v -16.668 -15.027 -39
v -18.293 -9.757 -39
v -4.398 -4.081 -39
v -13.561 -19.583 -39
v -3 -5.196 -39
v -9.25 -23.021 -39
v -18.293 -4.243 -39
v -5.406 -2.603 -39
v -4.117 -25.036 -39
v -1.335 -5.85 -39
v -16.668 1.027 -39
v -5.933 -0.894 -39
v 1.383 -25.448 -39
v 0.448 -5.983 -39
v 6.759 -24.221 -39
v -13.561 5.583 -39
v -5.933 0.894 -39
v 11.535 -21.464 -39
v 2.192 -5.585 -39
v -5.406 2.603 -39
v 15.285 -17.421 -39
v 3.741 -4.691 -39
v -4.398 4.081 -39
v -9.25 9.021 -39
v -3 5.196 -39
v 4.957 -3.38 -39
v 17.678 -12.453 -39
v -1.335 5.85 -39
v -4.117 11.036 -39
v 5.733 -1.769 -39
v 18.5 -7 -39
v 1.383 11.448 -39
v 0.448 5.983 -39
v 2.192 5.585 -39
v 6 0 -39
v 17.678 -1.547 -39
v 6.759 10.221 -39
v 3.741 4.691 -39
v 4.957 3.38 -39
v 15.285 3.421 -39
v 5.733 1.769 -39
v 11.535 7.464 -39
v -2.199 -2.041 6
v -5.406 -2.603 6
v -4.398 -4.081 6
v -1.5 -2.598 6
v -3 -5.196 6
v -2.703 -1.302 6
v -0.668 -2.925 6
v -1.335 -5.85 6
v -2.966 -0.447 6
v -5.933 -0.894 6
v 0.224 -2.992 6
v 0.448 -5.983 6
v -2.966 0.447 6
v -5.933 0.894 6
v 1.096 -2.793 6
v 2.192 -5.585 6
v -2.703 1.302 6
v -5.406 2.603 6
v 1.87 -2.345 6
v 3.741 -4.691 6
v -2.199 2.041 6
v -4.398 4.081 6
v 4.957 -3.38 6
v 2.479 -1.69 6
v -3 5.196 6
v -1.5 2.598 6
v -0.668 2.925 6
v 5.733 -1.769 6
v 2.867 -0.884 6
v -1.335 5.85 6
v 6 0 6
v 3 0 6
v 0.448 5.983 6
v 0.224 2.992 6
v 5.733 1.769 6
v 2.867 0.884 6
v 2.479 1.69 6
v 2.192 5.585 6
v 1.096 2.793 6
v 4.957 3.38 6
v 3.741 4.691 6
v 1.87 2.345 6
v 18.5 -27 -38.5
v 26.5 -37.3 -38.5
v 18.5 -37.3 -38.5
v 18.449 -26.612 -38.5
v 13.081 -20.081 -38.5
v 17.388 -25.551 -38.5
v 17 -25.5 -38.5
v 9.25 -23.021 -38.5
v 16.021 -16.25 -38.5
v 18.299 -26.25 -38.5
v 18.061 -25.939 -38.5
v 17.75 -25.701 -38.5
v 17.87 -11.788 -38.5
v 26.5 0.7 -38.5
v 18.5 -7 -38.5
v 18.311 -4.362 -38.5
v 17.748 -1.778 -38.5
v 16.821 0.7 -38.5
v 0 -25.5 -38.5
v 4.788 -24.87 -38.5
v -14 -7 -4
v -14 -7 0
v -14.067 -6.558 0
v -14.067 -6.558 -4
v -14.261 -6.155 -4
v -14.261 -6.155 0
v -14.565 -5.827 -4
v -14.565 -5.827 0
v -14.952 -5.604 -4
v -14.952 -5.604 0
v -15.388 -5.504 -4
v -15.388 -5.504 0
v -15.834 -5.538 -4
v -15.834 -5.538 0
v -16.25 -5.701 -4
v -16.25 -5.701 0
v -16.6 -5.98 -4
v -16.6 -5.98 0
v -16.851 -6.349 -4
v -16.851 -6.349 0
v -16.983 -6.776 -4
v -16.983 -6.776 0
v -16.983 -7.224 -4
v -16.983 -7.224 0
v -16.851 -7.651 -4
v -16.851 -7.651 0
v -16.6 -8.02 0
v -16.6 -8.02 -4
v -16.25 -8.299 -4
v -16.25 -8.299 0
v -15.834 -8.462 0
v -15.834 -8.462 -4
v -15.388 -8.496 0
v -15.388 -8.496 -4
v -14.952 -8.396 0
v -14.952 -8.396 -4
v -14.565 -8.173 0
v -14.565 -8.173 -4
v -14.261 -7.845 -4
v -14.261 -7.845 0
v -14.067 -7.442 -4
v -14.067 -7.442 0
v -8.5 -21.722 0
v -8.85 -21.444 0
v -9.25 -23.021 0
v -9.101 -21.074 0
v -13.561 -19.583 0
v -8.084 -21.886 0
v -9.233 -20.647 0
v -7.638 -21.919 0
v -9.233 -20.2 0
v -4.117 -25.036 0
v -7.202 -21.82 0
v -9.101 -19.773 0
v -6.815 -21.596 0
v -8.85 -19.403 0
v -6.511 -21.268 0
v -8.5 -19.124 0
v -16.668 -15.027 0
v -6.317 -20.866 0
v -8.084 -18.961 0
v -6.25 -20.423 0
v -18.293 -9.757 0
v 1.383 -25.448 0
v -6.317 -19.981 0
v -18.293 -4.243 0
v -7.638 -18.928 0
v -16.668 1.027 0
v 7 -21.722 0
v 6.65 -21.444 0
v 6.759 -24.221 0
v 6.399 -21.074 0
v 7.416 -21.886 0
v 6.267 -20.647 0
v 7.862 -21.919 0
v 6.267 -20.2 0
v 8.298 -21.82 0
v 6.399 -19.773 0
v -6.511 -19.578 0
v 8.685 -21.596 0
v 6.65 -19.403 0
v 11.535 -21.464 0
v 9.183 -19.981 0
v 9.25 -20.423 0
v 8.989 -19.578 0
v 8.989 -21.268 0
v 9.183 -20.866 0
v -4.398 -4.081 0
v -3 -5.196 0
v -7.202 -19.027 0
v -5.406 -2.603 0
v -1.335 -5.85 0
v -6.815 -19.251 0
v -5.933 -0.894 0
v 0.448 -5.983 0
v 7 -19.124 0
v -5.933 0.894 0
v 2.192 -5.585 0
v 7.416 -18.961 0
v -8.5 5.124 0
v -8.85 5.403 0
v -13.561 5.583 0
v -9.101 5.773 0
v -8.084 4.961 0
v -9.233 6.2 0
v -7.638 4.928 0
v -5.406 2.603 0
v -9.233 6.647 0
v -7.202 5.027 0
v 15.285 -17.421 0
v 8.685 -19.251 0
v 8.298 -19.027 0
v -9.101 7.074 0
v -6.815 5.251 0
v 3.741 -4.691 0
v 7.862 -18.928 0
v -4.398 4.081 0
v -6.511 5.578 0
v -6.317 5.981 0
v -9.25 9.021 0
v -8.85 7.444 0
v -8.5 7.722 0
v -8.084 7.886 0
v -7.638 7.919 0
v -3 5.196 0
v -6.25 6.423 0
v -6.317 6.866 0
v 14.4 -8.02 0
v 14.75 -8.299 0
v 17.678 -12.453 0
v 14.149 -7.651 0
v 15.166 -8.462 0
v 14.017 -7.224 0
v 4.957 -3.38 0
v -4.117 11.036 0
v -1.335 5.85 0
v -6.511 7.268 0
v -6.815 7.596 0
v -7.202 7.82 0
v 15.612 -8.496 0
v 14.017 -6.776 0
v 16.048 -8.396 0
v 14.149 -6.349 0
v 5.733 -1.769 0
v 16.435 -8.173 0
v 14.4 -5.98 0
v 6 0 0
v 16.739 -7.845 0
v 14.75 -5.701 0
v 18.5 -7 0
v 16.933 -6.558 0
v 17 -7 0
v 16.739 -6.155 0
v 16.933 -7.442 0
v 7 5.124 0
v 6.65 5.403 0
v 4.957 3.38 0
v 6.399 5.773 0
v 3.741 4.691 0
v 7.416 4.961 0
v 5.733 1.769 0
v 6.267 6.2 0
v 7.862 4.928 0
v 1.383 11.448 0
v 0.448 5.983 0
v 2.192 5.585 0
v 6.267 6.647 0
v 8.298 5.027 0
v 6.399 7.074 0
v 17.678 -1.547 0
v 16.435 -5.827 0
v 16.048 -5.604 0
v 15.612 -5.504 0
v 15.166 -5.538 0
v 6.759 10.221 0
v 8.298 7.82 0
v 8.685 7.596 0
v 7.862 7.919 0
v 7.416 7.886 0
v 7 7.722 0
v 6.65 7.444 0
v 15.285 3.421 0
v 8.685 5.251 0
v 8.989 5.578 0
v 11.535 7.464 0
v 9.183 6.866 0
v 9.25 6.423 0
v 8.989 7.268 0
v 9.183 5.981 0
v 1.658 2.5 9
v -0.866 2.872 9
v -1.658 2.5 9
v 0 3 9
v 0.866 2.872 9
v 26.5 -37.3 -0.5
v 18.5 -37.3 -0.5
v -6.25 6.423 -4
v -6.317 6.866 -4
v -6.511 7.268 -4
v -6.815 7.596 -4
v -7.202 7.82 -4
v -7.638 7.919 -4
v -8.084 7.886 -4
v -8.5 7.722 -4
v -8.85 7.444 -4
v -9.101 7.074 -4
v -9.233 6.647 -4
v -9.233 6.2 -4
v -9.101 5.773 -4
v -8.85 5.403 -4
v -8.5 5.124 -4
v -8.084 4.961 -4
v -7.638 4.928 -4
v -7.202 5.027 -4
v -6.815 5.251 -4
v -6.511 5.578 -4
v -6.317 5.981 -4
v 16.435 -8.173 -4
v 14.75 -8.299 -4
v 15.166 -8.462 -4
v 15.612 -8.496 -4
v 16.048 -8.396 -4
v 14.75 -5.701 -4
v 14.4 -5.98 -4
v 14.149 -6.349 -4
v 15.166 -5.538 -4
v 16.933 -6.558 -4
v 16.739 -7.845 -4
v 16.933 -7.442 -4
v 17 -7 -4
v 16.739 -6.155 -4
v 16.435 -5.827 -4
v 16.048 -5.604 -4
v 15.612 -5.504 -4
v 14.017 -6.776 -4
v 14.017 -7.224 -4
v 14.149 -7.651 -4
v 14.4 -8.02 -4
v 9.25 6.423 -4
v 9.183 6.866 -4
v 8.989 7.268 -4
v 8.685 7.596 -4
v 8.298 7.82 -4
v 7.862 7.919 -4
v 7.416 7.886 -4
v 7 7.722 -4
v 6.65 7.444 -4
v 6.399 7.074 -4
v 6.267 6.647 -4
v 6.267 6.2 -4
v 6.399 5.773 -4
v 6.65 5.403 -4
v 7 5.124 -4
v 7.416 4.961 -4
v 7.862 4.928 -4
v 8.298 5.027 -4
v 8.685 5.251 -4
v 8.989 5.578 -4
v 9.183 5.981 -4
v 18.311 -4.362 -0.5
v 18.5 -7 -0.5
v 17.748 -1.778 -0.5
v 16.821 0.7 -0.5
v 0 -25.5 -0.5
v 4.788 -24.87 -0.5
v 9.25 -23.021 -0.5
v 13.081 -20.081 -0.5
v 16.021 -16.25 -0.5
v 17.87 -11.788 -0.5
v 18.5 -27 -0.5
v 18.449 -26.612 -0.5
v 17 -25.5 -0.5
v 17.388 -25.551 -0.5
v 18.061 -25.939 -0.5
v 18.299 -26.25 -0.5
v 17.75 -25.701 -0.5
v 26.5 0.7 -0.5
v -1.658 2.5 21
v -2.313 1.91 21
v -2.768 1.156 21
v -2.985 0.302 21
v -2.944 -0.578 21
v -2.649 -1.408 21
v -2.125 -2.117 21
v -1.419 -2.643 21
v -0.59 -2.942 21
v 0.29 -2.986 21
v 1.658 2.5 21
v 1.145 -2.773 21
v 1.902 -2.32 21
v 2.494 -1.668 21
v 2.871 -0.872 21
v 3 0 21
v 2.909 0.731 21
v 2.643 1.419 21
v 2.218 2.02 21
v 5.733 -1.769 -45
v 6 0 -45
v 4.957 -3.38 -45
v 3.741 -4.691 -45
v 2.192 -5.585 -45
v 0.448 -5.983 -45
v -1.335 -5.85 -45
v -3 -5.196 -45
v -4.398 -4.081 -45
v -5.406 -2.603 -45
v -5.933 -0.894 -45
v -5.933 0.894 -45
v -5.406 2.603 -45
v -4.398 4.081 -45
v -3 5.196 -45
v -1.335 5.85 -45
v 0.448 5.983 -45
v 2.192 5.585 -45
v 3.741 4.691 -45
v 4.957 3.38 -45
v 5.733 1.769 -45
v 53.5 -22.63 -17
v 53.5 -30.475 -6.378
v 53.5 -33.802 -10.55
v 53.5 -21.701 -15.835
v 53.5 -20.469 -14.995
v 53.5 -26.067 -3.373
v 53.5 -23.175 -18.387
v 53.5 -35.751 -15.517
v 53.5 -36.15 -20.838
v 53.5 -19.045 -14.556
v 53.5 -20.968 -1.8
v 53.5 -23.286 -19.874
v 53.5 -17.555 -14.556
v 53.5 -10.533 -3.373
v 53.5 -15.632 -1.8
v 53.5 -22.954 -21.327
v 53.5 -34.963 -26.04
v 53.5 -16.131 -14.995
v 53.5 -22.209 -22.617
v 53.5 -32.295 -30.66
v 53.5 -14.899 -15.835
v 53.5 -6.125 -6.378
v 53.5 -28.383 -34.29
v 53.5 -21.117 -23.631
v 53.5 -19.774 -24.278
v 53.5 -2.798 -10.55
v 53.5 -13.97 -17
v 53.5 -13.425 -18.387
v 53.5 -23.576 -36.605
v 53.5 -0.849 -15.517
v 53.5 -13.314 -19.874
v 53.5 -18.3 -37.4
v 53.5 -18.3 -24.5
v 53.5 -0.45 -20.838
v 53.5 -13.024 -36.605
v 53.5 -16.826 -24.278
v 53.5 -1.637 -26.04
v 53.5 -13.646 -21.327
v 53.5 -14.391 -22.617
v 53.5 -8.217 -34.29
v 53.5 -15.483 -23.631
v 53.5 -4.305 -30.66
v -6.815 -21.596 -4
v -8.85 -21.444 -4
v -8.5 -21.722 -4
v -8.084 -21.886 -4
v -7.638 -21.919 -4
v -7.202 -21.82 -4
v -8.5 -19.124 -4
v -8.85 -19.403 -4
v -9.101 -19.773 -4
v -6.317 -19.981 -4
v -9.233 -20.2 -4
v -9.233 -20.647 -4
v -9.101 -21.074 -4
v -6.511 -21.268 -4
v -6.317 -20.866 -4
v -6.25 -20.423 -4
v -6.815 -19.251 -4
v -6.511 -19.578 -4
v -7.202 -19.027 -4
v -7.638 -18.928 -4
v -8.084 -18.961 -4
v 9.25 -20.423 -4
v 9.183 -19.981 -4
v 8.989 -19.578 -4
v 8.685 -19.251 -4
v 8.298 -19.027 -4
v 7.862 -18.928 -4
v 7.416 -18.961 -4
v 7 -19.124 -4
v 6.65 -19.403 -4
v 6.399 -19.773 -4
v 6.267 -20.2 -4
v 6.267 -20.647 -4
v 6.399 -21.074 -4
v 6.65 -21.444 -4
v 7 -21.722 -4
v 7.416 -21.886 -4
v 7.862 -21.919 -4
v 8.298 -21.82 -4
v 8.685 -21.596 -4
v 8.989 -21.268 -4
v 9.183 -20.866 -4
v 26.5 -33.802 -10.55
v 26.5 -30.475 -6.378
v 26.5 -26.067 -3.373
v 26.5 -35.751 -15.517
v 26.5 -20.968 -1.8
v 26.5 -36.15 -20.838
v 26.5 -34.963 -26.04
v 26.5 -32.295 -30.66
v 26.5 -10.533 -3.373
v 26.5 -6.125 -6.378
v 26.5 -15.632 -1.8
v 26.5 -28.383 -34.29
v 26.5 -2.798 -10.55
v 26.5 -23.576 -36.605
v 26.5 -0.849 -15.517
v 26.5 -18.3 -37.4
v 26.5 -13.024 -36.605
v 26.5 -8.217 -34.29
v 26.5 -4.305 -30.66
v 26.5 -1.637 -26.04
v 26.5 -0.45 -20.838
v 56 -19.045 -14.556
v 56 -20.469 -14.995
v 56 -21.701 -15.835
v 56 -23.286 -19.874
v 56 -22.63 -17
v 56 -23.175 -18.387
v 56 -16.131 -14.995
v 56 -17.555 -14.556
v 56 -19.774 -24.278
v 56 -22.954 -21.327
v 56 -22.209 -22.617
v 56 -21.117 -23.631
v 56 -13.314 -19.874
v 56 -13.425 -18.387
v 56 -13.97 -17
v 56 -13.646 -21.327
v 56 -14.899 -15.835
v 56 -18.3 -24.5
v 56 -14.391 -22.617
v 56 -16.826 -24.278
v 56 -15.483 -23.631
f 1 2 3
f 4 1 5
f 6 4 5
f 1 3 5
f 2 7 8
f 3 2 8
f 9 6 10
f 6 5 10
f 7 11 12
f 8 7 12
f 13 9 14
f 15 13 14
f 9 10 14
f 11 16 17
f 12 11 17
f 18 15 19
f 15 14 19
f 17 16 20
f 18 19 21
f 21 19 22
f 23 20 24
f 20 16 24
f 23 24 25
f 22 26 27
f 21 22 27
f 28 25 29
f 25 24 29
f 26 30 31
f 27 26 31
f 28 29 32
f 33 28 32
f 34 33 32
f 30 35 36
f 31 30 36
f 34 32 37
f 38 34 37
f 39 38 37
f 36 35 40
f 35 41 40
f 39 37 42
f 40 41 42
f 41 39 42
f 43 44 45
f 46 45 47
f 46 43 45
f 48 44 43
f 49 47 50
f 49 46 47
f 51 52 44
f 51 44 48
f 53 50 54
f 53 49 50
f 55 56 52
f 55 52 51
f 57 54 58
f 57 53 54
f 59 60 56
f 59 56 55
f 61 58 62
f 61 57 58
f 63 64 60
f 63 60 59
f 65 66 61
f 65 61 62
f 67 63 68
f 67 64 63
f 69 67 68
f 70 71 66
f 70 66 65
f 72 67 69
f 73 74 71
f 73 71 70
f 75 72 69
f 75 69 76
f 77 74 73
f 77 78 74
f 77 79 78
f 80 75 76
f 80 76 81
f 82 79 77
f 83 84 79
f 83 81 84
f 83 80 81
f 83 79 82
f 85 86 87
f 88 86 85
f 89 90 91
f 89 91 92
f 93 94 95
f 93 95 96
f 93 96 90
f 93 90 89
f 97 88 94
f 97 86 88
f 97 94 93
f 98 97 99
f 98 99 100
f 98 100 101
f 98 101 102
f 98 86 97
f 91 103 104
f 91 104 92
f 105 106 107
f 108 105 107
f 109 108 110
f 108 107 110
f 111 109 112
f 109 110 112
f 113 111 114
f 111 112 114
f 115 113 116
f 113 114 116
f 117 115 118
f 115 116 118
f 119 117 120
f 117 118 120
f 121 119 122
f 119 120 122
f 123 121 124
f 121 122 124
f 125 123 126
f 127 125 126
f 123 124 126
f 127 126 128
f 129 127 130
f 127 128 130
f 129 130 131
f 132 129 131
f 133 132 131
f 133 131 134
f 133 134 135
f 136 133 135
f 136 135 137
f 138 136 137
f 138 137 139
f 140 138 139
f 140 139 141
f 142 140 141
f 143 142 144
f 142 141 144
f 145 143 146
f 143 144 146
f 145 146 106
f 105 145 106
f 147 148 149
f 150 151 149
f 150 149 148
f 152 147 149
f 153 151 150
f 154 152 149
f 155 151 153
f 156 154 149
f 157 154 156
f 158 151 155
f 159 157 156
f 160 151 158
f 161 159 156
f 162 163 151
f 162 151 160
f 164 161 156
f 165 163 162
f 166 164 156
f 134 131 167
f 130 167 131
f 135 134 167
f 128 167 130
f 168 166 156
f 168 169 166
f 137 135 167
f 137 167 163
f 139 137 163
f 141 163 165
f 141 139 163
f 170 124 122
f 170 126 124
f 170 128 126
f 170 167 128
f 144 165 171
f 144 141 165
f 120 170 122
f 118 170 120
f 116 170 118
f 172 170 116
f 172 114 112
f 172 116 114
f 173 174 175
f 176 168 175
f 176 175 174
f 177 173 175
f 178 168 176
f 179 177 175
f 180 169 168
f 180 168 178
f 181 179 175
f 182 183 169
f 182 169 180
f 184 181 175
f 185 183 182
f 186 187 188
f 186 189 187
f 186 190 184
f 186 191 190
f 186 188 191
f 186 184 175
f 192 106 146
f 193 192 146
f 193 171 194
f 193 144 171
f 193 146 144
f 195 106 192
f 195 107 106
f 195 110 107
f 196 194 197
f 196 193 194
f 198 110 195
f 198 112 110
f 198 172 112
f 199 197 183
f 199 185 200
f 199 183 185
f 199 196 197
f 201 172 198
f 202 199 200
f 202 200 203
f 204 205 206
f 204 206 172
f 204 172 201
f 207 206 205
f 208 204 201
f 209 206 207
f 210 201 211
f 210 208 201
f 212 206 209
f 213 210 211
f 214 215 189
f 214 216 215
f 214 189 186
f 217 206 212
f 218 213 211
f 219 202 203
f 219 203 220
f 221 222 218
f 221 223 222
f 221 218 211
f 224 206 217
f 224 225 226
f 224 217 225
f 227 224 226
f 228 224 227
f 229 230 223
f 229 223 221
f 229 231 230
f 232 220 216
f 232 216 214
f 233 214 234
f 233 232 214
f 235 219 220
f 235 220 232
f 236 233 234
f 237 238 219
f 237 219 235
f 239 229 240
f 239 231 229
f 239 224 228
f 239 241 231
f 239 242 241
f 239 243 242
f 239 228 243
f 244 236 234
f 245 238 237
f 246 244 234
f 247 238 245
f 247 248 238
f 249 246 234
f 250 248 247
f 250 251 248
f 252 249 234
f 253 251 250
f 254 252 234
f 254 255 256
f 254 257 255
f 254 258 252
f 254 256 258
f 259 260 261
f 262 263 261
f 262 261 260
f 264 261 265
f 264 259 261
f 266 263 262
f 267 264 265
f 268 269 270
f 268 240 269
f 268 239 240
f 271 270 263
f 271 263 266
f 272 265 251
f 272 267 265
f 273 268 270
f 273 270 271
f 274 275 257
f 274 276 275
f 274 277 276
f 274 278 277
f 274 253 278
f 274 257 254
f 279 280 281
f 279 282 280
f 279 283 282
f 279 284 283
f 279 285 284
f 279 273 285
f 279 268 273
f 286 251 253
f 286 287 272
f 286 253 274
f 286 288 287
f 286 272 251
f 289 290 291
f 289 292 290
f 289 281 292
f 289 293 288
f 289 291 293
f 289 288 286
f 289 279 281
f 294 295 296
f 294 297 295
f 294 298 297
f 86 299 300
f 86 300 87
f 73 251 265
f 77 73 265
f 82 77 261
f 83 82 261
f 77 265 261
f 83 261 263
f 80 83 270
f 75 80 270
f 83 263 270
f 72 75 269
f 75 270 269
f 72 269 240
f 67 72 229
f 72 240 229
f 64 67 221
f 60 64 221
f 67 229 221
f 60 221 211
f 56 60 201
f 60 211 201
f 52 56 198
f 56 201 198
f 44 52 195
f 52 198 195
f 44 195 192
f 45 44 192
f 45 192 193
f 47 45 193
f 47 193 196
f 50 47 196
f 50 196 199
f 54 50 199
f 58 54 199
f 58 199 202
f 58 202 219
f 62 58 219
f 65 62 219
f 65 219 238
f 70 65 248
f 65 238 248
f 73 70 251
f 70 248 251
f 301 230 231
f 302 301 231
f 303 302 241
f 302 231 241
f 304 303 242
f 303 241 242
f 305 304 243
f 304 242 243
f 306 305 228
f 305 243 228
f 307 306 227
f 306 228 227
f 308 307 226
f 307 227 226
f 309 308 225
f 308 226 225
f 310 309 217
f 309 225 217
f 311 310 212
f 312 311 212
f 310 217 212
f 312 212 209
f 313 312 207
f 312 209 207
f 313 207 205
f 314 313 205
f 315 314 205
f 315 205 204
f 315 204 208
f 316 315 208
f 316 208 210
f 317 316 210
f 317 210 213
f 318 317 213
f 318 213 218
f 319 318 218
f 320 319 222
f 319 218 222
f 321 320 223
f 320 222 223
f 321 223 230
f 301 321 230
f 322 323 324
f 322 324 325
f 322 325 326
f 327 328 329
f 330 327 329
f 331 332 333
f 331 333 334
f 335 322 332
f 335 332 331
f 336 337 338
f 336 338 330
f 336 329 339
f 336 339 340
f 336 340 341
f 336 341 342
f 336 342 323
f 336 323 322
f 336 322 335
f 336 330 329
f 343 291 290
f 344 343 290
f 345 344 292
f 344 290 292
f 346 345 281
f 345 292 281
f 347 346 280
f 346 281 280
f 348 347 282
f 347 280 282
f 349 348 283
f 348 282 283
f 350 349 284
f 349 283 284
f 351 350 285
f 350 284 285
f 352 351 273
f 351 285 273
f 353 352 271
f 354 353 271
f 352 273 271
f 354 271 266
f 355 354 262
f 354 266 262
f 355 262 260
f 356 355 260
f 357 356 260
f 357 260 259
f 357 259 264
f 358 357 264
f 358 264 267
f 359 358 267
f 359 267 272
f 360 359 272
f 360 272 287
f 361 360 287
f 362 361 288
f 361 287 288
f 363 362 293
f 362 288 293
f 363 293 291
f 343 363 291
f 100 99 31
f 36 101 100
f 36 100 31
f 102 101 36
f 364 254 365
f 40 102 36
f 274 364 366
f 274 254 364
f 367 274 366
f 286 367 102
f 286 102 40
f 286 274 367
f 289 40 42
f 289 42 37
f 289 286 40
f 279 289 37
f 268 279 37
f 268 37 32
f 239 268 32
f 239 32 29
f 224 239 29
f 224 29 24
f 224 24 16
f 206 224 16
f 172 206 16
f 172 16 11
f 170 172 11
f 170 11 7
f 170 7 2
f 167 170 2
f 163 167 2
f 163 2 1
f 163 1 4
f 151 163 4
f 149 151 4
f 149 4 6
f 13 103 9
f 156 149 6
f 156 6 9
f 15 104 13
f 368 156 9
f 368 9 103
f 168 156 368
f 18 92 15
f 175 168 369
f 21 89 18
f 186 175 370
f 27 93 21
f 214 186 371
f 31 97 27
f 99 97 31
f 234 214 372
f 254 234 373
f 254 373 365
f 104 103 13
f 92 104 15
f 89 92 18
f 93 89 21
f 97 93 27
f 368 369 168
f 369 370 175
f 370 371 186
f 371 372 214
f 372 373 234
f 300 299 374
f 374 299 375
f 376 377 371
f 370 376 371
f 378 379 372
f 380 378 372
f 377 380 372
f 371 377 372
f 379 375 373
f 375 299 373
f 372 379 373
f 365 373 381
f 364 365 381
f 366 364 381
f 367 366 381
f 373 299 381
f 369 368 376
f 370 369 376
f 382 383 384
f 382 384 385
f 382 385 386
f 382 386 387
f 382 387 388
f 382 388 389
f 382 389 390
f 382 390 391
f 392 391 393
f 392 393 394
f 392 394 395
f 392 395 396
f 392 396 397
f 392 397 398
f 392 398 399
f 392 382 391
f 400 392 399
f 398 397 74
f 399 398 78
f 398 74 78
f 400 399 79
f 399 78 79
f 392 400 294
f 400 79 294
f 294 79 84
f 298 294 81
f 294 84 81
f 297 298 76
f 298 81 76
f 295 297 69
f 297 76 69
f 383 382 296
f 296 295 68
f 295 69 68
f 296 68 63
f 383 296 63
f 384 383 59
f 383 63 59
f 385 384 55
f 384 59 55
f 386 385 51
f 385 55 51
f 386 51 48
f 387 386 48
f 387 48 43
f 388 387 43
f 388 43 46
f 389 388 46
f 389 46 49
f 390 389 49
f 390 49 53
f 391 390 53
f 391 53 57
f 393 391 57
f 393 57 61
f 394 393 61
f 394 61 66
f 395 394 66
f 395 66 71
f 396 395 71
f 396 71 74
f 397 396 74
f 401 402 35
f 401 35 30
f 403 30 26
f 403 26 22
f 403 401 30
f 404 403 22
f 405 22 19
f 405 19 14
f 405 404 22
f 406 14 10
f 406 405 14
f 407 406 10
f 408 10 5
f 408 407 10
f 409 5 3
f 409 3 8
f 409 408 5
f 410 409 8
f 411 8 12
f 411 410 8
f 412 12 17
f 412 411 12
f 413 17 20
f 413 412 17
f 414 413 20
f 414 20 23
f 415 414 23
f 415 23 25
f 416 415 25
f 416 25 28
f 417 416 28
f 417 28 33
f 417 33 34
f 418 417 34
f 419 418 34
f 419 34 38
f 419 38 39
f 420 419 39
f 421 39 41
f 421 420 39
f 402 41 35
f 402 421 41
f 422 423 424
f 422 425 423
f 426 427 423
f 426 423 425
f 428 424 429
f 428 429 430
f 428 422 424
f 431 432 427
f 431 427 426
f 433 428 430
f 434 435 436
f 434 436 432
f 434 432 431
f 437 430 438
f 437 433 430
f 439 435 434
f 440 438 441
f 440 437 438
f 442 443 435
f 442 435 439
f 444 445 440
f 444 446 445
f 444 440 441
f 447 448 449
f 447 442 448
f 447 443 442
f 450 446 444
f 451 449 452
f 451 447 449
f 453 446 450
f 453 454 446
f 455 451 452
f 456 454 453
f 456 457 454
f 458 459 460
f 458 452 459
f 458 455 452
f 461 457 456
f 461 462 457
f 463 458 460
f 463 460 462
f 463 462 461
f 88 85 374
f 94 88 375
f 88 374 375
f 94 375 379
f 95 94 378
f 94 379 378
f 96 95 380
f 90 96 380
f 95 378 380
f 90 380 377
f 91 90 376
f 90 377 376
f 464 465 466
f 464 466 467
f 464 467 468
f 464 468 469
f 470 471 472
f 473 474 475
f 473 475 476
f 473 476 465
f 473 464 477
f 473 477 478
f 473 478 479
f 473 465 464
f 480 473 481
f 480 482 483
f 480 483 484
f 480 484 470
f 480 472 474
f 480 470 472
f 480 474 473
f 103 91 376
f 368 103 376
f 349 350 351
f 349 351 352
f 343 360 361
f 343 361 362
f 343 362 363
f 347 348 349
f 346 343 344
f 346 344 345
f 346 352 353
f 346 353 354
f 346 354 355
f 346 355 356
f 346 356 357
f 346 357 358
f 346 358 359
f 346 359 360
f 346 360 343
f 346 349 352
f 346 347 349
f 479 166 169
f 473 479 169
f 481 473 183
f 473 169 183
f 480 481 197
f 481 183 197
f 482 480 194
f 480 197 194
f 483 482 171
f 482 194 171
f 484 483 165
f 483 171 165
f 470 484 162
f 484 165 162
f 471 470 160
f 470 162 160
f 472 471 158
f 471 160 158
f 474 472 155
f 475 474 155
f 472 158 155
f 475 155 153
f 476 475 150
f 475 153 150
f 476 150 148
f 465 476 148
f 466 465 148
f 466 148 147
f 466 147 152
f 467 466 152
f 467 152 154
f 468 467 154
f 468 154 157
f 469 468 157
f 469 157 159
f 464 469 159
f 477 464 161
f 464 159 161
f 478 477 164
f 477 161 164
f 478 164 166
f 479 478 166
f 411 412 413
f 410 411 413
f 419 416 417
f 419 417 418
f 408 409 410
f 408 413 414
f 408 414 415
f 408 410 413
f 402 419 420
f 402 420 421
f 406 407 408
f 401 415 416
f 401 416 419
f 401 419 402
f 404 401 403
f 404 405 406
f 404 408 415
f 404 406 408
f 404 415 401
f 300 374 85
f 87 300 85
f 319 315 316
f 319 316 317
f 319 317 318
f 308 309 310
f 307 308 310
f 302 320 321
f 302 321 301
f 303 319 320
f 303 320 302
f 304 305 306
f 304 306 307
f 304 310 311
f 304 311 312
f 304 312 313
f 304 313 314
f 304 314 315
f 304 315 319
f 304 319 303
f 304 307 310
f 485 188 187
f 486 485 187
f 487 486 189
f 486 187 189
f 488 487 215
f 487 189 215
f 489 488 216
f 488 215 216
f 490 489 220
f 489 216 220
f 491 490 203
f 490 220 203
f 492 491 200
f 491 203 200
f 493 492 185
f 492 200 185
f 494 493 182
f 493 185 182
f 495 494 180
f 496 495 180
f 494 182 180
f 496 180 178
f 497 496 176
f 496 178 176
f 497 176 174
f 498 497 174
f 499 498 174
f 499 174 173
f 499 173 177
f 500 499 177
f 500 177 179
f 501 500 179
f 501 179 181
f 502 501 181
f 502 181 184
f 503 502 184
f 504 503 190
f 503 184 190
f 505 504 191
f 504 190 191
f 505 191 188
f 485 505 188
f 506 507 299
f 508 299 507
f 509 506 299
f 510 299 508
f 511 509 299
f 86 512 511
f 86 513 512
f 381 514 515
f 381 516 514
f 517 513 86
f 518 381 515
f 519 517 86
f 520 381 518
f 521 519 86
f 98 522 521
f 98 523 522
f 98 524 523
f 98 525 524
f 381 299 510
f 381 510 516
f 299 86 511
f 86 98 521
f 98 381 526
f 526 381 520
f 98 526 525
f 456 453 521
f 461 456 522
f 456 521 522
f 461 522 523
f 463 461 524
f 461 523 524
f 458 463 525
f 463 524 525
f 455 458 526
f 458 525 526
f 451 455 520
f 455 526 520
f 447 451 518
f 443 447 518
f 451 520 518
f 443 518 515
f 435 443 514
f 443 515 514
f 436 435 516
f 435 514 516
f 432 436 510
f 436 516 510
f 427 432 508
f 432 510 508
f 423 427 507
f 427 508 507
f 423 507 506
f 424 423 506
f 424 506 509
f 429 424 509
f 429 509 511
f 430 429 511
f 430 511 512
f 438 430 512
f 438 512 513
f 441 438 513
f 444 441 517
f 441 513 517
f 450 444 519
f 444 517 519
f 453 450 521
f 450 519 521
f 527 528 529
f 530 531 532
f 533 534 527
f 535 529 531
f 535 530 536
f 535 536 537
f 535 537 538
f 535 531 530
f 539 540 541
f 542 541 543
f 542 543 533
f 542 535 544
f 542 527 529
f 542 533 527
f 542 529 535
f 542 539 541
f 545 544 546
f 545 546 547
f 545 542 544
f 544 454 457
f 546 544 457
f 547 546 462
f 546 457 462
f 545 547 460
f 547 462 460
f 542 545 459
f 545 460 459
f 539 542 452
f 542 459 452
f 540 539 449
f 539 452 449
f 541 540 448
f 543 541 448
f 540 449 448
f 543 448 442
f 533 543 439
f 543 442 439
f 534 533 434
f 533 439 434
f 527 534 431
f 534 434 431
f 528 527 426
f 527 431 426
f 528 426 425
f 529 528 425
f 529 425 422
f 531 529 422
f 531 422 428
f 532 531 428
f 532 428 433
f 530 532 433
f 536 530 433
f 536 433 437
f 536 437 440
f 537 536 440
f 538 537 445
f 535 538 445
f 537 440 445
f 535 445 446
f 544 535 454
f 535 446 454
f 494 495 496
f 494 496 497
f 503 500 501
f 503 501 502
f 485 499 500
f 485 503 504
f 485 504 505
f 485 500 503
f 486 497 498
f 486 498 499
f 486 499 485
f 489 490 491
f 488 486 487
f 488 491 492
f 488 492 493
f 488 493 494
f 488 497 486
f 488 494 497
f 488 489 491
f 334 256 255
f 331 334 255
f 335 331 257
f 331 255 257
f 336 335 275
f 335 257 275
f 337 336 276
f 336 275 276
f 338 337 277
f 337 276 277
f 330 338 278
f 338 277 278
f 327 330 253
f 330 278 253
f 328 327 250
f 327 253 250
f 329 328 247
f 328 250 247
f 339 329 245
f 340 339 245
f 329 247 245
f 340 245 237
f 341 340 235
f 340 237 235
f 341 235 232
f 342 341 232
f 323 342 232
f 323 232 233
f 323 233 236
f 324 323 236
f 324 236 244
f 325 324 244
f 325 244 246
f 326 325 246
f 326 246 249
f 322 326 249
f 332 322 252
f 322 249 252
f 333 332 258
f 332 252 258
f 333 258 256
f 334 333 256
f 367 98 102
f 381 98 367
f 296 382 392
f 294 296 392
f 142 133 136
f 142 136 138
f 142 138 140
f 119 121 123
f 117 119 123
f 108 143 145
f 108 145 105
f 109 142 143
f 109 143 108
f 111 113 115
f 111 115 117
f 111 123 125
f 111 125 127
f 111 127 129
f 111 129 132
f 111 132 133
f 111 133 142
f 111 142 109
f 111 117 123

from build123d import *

# Parameters (mm, degrees)
SKETCH_1_R           = 6
EXTRUDE_1_DEPTH      = 6
SKETCH_2_R           = 3
EXTRUDE_2_DEPTH      = 15
SKETCH_4_OUTSIDE_W   = 19.4
SKETCH_4_OUTSIDE_H   = 19.4
CUT_EXTRUDE_1_DEPTH  = 12
SKETCH_5_R           = 18.5
EXTRUDE_3_DEPTH      = 39
EXTRUDE_START        = 6
SKETCH_6_R           = 6
EXTRUDE_4_DEPTH      = 6
SKETCH_7_W           = 38
SKETCH_7_H           = 38
EXTRUDE_5_DEPTH      = 8
EXTRUDE_6_REACH      = 71.176
EXTRUDE_6_END_RADIUS = 18.5
SKETCH_8_W           = 38
SKETCH_8_H           = 26.2
SKETCH_9_R           = 17.9
EXTRUDE_7_DEPTH      = 27
SKETCH_10_R          = 5
EXTRUDE_8_DEPTH      = 2.5
SKETCH_11_R          = 1.5
CUT_EXTRUDE_2_DEPTH  = 4
FILLET_1_R           = 1.5


with BuildPart() as part:
    # ｽｹｯﾁ1 → ﾎﾞｽ - 押し出し1 (new body)
    with BuildSketch(Plane.XY):
        Circle(SKETCH_1_R)
    extrude(amount=EXTRUDE_1_DEPTH)

    # ｽｹｯﾁ2 → ﾎﾞｽ - 押し出し2 (add)
    with BuildSketch(Plane.XY.offset(6)):
        Circle(SKETCH_2_R)
    extrude(amount=EXTRUDE_2_DEPTH)

    # ｽｹｯﾁ4 outside → ｶｯﾄ - 押し出し1 (cut)
    with BuildSketch(Plane.XY.offset(21)):
        Rectangle(SKETCH_4_OUTSIDE_W, SKETCH_4_OUTSIDE_H)
        with BuildLine():
            Line((-1.658312395, 2.5), (1.658312395, 2.5))
            ThreePointArc((1.658312395, 2.5), (0, -3), (-1.658312395, 2.5))
        make_face(mode=Mode.SUBTRACT)
    extrude(amount=-CUT_EXTRUDE_1_DEPTH, mode=Mode.SUBTRACT)

    # ｽｹｯﾁ5 → ﾎﾞｽ - 押し出し3 (add)
    with BuildSketch(Plane.XY):
        with Locations((0, -7)):
            Circle(SKETCH_5_R)
    extrude(amount=-EXTRUDE_3_DEPTH)

    # ｽｹｯﾁ6 → ﾎﾞｽ - 押し出し4 (add)
    with BuildSketch(Plane(origin=(0, 0, -39), x_dir=(-1, 0, 0), z_dir=(0, 0, -1)).offset(EXTRUDE_START)):
        with Locations(Location((0, 0, 0), (0, 0, 180))):
            Circle(SKETCH_6_R)
    extrude(amount=-EXTRUDE_4_DEPTH)



with BuildPart() as body_2:
    # ｽｹｯﾁ7 → ﾎﾞｽ - 押し出し5 (new body)
    with BuildSketch(Plane(origin=(26.5, 0, 0), x_dir=(0, 0, -1), z_dir=(1, 0, 0))):
        with Locations((19.5, -18.3)):
            Rectangle(SKETCH_7_W, SKETCH_7_H)
    extrude(amount=-EXTRUDE_5_DEPTH)


with BuildPart() as part_1:
    add(part.part)

    add(body_2.part)  # ﾎﾞｽ - 押し出し6 merges body 2
    # ﾎﾞｽ - 押し出し6: up to this cylinder (the profile starts outside it)
    extrude_6_end = Plane(origin=(0, -7, -19.5), z_dir=(0, 0, 1)) * Cylinder(EXTRUDE_6_END_RADIUS, 180.352, mode=Mode.PRIVATE)
    # ｽｹｯﾁ8 → ﾎﾞｽ - 押し出し6 (add, up to the surface)
    with BuildSketch(Plane.ZY.offset(-18.5), mode=Mode.PRIVATE) as extrude_6_sk1:
        with Locations((-19.5, -12.4)):
            Rectangle(SKETCH_8_W, SKETCH_8_H)
    extrude_6_tool1 = extrude(extrude_6_sk1.sketch, amount=EXTRUDE_6_REACH, mode=Mode.PRIVATE) - extrude_6_end
    add(extrude_6_tool1.solids().sort_by_distance((18.5, -12.4, -19.5))[0])
    add(extrude_6_tool1.solids().sort_by_distance((18.5, -12.4, -19.5))[1])

    # ｽｹｯﾁ9 → ﾎﾞｽ - 押し出し7 (add)
    with BuildSketch(Plane(origin=(26.5, 0, 0), x_dir=(0, 0, -1), z_dir=(1, 0, 0))):
        with Locations((19.5, -18.3)):
            Circle(SKETCH_9_R)
    extrude(amount=EXTRUDE_7_DEPTH)

    # ｽｹｯﾁ10 → ﾎﾞｽ - 押し出し8 (add)
    with BuildSketch(Plane(origin=(53.5, 0, 0), x_dir=(0, 0, -1), z_dir=(1, 0, 0))):
        with Locations((19.5, -18.3)):
            Circle(SKETCH_10_R)
    extrude(amount=EXTRUDE_8_DEPTH)

    # ｽｹｯﾁ11 → ｶｯﾄ - 押し出し2 (cut)
    with BuildSketch(Plane.XY):
        with Locations((-15.5, -7)):
            Circle(SKETCH_11_R)
        with Locations((-7.75, 6.423393759)):
            Circle(SKETCH_11_R)
        with Locations((7.75, 6.423393759)):
            Circle(SKETCH_11_R)
        with Locations((15.5, -7)):
            Circle(SKETCH_11_R)
        with Locations((7.75, -20.423393759)):
            Circle(SKETCH_11_R)
        with Locations((-7.75, -20.423393759)):
            Circle(SKETCH_11_R)
    extrude(amount=-CUT_EXTRUDE_2_DEPTH, mode=Mode.SUBTRACT)

    # ﾌｨﾚｯﾄ1
    fillet_1_edges = [part_1.edges().sort_by_distance(p)[0] for p in [
        (18.5, -25.5, -19.5),
    ]]
    fillet(fillet_1_edges, radius=FILLET_1_R)


solid = part_1.part
